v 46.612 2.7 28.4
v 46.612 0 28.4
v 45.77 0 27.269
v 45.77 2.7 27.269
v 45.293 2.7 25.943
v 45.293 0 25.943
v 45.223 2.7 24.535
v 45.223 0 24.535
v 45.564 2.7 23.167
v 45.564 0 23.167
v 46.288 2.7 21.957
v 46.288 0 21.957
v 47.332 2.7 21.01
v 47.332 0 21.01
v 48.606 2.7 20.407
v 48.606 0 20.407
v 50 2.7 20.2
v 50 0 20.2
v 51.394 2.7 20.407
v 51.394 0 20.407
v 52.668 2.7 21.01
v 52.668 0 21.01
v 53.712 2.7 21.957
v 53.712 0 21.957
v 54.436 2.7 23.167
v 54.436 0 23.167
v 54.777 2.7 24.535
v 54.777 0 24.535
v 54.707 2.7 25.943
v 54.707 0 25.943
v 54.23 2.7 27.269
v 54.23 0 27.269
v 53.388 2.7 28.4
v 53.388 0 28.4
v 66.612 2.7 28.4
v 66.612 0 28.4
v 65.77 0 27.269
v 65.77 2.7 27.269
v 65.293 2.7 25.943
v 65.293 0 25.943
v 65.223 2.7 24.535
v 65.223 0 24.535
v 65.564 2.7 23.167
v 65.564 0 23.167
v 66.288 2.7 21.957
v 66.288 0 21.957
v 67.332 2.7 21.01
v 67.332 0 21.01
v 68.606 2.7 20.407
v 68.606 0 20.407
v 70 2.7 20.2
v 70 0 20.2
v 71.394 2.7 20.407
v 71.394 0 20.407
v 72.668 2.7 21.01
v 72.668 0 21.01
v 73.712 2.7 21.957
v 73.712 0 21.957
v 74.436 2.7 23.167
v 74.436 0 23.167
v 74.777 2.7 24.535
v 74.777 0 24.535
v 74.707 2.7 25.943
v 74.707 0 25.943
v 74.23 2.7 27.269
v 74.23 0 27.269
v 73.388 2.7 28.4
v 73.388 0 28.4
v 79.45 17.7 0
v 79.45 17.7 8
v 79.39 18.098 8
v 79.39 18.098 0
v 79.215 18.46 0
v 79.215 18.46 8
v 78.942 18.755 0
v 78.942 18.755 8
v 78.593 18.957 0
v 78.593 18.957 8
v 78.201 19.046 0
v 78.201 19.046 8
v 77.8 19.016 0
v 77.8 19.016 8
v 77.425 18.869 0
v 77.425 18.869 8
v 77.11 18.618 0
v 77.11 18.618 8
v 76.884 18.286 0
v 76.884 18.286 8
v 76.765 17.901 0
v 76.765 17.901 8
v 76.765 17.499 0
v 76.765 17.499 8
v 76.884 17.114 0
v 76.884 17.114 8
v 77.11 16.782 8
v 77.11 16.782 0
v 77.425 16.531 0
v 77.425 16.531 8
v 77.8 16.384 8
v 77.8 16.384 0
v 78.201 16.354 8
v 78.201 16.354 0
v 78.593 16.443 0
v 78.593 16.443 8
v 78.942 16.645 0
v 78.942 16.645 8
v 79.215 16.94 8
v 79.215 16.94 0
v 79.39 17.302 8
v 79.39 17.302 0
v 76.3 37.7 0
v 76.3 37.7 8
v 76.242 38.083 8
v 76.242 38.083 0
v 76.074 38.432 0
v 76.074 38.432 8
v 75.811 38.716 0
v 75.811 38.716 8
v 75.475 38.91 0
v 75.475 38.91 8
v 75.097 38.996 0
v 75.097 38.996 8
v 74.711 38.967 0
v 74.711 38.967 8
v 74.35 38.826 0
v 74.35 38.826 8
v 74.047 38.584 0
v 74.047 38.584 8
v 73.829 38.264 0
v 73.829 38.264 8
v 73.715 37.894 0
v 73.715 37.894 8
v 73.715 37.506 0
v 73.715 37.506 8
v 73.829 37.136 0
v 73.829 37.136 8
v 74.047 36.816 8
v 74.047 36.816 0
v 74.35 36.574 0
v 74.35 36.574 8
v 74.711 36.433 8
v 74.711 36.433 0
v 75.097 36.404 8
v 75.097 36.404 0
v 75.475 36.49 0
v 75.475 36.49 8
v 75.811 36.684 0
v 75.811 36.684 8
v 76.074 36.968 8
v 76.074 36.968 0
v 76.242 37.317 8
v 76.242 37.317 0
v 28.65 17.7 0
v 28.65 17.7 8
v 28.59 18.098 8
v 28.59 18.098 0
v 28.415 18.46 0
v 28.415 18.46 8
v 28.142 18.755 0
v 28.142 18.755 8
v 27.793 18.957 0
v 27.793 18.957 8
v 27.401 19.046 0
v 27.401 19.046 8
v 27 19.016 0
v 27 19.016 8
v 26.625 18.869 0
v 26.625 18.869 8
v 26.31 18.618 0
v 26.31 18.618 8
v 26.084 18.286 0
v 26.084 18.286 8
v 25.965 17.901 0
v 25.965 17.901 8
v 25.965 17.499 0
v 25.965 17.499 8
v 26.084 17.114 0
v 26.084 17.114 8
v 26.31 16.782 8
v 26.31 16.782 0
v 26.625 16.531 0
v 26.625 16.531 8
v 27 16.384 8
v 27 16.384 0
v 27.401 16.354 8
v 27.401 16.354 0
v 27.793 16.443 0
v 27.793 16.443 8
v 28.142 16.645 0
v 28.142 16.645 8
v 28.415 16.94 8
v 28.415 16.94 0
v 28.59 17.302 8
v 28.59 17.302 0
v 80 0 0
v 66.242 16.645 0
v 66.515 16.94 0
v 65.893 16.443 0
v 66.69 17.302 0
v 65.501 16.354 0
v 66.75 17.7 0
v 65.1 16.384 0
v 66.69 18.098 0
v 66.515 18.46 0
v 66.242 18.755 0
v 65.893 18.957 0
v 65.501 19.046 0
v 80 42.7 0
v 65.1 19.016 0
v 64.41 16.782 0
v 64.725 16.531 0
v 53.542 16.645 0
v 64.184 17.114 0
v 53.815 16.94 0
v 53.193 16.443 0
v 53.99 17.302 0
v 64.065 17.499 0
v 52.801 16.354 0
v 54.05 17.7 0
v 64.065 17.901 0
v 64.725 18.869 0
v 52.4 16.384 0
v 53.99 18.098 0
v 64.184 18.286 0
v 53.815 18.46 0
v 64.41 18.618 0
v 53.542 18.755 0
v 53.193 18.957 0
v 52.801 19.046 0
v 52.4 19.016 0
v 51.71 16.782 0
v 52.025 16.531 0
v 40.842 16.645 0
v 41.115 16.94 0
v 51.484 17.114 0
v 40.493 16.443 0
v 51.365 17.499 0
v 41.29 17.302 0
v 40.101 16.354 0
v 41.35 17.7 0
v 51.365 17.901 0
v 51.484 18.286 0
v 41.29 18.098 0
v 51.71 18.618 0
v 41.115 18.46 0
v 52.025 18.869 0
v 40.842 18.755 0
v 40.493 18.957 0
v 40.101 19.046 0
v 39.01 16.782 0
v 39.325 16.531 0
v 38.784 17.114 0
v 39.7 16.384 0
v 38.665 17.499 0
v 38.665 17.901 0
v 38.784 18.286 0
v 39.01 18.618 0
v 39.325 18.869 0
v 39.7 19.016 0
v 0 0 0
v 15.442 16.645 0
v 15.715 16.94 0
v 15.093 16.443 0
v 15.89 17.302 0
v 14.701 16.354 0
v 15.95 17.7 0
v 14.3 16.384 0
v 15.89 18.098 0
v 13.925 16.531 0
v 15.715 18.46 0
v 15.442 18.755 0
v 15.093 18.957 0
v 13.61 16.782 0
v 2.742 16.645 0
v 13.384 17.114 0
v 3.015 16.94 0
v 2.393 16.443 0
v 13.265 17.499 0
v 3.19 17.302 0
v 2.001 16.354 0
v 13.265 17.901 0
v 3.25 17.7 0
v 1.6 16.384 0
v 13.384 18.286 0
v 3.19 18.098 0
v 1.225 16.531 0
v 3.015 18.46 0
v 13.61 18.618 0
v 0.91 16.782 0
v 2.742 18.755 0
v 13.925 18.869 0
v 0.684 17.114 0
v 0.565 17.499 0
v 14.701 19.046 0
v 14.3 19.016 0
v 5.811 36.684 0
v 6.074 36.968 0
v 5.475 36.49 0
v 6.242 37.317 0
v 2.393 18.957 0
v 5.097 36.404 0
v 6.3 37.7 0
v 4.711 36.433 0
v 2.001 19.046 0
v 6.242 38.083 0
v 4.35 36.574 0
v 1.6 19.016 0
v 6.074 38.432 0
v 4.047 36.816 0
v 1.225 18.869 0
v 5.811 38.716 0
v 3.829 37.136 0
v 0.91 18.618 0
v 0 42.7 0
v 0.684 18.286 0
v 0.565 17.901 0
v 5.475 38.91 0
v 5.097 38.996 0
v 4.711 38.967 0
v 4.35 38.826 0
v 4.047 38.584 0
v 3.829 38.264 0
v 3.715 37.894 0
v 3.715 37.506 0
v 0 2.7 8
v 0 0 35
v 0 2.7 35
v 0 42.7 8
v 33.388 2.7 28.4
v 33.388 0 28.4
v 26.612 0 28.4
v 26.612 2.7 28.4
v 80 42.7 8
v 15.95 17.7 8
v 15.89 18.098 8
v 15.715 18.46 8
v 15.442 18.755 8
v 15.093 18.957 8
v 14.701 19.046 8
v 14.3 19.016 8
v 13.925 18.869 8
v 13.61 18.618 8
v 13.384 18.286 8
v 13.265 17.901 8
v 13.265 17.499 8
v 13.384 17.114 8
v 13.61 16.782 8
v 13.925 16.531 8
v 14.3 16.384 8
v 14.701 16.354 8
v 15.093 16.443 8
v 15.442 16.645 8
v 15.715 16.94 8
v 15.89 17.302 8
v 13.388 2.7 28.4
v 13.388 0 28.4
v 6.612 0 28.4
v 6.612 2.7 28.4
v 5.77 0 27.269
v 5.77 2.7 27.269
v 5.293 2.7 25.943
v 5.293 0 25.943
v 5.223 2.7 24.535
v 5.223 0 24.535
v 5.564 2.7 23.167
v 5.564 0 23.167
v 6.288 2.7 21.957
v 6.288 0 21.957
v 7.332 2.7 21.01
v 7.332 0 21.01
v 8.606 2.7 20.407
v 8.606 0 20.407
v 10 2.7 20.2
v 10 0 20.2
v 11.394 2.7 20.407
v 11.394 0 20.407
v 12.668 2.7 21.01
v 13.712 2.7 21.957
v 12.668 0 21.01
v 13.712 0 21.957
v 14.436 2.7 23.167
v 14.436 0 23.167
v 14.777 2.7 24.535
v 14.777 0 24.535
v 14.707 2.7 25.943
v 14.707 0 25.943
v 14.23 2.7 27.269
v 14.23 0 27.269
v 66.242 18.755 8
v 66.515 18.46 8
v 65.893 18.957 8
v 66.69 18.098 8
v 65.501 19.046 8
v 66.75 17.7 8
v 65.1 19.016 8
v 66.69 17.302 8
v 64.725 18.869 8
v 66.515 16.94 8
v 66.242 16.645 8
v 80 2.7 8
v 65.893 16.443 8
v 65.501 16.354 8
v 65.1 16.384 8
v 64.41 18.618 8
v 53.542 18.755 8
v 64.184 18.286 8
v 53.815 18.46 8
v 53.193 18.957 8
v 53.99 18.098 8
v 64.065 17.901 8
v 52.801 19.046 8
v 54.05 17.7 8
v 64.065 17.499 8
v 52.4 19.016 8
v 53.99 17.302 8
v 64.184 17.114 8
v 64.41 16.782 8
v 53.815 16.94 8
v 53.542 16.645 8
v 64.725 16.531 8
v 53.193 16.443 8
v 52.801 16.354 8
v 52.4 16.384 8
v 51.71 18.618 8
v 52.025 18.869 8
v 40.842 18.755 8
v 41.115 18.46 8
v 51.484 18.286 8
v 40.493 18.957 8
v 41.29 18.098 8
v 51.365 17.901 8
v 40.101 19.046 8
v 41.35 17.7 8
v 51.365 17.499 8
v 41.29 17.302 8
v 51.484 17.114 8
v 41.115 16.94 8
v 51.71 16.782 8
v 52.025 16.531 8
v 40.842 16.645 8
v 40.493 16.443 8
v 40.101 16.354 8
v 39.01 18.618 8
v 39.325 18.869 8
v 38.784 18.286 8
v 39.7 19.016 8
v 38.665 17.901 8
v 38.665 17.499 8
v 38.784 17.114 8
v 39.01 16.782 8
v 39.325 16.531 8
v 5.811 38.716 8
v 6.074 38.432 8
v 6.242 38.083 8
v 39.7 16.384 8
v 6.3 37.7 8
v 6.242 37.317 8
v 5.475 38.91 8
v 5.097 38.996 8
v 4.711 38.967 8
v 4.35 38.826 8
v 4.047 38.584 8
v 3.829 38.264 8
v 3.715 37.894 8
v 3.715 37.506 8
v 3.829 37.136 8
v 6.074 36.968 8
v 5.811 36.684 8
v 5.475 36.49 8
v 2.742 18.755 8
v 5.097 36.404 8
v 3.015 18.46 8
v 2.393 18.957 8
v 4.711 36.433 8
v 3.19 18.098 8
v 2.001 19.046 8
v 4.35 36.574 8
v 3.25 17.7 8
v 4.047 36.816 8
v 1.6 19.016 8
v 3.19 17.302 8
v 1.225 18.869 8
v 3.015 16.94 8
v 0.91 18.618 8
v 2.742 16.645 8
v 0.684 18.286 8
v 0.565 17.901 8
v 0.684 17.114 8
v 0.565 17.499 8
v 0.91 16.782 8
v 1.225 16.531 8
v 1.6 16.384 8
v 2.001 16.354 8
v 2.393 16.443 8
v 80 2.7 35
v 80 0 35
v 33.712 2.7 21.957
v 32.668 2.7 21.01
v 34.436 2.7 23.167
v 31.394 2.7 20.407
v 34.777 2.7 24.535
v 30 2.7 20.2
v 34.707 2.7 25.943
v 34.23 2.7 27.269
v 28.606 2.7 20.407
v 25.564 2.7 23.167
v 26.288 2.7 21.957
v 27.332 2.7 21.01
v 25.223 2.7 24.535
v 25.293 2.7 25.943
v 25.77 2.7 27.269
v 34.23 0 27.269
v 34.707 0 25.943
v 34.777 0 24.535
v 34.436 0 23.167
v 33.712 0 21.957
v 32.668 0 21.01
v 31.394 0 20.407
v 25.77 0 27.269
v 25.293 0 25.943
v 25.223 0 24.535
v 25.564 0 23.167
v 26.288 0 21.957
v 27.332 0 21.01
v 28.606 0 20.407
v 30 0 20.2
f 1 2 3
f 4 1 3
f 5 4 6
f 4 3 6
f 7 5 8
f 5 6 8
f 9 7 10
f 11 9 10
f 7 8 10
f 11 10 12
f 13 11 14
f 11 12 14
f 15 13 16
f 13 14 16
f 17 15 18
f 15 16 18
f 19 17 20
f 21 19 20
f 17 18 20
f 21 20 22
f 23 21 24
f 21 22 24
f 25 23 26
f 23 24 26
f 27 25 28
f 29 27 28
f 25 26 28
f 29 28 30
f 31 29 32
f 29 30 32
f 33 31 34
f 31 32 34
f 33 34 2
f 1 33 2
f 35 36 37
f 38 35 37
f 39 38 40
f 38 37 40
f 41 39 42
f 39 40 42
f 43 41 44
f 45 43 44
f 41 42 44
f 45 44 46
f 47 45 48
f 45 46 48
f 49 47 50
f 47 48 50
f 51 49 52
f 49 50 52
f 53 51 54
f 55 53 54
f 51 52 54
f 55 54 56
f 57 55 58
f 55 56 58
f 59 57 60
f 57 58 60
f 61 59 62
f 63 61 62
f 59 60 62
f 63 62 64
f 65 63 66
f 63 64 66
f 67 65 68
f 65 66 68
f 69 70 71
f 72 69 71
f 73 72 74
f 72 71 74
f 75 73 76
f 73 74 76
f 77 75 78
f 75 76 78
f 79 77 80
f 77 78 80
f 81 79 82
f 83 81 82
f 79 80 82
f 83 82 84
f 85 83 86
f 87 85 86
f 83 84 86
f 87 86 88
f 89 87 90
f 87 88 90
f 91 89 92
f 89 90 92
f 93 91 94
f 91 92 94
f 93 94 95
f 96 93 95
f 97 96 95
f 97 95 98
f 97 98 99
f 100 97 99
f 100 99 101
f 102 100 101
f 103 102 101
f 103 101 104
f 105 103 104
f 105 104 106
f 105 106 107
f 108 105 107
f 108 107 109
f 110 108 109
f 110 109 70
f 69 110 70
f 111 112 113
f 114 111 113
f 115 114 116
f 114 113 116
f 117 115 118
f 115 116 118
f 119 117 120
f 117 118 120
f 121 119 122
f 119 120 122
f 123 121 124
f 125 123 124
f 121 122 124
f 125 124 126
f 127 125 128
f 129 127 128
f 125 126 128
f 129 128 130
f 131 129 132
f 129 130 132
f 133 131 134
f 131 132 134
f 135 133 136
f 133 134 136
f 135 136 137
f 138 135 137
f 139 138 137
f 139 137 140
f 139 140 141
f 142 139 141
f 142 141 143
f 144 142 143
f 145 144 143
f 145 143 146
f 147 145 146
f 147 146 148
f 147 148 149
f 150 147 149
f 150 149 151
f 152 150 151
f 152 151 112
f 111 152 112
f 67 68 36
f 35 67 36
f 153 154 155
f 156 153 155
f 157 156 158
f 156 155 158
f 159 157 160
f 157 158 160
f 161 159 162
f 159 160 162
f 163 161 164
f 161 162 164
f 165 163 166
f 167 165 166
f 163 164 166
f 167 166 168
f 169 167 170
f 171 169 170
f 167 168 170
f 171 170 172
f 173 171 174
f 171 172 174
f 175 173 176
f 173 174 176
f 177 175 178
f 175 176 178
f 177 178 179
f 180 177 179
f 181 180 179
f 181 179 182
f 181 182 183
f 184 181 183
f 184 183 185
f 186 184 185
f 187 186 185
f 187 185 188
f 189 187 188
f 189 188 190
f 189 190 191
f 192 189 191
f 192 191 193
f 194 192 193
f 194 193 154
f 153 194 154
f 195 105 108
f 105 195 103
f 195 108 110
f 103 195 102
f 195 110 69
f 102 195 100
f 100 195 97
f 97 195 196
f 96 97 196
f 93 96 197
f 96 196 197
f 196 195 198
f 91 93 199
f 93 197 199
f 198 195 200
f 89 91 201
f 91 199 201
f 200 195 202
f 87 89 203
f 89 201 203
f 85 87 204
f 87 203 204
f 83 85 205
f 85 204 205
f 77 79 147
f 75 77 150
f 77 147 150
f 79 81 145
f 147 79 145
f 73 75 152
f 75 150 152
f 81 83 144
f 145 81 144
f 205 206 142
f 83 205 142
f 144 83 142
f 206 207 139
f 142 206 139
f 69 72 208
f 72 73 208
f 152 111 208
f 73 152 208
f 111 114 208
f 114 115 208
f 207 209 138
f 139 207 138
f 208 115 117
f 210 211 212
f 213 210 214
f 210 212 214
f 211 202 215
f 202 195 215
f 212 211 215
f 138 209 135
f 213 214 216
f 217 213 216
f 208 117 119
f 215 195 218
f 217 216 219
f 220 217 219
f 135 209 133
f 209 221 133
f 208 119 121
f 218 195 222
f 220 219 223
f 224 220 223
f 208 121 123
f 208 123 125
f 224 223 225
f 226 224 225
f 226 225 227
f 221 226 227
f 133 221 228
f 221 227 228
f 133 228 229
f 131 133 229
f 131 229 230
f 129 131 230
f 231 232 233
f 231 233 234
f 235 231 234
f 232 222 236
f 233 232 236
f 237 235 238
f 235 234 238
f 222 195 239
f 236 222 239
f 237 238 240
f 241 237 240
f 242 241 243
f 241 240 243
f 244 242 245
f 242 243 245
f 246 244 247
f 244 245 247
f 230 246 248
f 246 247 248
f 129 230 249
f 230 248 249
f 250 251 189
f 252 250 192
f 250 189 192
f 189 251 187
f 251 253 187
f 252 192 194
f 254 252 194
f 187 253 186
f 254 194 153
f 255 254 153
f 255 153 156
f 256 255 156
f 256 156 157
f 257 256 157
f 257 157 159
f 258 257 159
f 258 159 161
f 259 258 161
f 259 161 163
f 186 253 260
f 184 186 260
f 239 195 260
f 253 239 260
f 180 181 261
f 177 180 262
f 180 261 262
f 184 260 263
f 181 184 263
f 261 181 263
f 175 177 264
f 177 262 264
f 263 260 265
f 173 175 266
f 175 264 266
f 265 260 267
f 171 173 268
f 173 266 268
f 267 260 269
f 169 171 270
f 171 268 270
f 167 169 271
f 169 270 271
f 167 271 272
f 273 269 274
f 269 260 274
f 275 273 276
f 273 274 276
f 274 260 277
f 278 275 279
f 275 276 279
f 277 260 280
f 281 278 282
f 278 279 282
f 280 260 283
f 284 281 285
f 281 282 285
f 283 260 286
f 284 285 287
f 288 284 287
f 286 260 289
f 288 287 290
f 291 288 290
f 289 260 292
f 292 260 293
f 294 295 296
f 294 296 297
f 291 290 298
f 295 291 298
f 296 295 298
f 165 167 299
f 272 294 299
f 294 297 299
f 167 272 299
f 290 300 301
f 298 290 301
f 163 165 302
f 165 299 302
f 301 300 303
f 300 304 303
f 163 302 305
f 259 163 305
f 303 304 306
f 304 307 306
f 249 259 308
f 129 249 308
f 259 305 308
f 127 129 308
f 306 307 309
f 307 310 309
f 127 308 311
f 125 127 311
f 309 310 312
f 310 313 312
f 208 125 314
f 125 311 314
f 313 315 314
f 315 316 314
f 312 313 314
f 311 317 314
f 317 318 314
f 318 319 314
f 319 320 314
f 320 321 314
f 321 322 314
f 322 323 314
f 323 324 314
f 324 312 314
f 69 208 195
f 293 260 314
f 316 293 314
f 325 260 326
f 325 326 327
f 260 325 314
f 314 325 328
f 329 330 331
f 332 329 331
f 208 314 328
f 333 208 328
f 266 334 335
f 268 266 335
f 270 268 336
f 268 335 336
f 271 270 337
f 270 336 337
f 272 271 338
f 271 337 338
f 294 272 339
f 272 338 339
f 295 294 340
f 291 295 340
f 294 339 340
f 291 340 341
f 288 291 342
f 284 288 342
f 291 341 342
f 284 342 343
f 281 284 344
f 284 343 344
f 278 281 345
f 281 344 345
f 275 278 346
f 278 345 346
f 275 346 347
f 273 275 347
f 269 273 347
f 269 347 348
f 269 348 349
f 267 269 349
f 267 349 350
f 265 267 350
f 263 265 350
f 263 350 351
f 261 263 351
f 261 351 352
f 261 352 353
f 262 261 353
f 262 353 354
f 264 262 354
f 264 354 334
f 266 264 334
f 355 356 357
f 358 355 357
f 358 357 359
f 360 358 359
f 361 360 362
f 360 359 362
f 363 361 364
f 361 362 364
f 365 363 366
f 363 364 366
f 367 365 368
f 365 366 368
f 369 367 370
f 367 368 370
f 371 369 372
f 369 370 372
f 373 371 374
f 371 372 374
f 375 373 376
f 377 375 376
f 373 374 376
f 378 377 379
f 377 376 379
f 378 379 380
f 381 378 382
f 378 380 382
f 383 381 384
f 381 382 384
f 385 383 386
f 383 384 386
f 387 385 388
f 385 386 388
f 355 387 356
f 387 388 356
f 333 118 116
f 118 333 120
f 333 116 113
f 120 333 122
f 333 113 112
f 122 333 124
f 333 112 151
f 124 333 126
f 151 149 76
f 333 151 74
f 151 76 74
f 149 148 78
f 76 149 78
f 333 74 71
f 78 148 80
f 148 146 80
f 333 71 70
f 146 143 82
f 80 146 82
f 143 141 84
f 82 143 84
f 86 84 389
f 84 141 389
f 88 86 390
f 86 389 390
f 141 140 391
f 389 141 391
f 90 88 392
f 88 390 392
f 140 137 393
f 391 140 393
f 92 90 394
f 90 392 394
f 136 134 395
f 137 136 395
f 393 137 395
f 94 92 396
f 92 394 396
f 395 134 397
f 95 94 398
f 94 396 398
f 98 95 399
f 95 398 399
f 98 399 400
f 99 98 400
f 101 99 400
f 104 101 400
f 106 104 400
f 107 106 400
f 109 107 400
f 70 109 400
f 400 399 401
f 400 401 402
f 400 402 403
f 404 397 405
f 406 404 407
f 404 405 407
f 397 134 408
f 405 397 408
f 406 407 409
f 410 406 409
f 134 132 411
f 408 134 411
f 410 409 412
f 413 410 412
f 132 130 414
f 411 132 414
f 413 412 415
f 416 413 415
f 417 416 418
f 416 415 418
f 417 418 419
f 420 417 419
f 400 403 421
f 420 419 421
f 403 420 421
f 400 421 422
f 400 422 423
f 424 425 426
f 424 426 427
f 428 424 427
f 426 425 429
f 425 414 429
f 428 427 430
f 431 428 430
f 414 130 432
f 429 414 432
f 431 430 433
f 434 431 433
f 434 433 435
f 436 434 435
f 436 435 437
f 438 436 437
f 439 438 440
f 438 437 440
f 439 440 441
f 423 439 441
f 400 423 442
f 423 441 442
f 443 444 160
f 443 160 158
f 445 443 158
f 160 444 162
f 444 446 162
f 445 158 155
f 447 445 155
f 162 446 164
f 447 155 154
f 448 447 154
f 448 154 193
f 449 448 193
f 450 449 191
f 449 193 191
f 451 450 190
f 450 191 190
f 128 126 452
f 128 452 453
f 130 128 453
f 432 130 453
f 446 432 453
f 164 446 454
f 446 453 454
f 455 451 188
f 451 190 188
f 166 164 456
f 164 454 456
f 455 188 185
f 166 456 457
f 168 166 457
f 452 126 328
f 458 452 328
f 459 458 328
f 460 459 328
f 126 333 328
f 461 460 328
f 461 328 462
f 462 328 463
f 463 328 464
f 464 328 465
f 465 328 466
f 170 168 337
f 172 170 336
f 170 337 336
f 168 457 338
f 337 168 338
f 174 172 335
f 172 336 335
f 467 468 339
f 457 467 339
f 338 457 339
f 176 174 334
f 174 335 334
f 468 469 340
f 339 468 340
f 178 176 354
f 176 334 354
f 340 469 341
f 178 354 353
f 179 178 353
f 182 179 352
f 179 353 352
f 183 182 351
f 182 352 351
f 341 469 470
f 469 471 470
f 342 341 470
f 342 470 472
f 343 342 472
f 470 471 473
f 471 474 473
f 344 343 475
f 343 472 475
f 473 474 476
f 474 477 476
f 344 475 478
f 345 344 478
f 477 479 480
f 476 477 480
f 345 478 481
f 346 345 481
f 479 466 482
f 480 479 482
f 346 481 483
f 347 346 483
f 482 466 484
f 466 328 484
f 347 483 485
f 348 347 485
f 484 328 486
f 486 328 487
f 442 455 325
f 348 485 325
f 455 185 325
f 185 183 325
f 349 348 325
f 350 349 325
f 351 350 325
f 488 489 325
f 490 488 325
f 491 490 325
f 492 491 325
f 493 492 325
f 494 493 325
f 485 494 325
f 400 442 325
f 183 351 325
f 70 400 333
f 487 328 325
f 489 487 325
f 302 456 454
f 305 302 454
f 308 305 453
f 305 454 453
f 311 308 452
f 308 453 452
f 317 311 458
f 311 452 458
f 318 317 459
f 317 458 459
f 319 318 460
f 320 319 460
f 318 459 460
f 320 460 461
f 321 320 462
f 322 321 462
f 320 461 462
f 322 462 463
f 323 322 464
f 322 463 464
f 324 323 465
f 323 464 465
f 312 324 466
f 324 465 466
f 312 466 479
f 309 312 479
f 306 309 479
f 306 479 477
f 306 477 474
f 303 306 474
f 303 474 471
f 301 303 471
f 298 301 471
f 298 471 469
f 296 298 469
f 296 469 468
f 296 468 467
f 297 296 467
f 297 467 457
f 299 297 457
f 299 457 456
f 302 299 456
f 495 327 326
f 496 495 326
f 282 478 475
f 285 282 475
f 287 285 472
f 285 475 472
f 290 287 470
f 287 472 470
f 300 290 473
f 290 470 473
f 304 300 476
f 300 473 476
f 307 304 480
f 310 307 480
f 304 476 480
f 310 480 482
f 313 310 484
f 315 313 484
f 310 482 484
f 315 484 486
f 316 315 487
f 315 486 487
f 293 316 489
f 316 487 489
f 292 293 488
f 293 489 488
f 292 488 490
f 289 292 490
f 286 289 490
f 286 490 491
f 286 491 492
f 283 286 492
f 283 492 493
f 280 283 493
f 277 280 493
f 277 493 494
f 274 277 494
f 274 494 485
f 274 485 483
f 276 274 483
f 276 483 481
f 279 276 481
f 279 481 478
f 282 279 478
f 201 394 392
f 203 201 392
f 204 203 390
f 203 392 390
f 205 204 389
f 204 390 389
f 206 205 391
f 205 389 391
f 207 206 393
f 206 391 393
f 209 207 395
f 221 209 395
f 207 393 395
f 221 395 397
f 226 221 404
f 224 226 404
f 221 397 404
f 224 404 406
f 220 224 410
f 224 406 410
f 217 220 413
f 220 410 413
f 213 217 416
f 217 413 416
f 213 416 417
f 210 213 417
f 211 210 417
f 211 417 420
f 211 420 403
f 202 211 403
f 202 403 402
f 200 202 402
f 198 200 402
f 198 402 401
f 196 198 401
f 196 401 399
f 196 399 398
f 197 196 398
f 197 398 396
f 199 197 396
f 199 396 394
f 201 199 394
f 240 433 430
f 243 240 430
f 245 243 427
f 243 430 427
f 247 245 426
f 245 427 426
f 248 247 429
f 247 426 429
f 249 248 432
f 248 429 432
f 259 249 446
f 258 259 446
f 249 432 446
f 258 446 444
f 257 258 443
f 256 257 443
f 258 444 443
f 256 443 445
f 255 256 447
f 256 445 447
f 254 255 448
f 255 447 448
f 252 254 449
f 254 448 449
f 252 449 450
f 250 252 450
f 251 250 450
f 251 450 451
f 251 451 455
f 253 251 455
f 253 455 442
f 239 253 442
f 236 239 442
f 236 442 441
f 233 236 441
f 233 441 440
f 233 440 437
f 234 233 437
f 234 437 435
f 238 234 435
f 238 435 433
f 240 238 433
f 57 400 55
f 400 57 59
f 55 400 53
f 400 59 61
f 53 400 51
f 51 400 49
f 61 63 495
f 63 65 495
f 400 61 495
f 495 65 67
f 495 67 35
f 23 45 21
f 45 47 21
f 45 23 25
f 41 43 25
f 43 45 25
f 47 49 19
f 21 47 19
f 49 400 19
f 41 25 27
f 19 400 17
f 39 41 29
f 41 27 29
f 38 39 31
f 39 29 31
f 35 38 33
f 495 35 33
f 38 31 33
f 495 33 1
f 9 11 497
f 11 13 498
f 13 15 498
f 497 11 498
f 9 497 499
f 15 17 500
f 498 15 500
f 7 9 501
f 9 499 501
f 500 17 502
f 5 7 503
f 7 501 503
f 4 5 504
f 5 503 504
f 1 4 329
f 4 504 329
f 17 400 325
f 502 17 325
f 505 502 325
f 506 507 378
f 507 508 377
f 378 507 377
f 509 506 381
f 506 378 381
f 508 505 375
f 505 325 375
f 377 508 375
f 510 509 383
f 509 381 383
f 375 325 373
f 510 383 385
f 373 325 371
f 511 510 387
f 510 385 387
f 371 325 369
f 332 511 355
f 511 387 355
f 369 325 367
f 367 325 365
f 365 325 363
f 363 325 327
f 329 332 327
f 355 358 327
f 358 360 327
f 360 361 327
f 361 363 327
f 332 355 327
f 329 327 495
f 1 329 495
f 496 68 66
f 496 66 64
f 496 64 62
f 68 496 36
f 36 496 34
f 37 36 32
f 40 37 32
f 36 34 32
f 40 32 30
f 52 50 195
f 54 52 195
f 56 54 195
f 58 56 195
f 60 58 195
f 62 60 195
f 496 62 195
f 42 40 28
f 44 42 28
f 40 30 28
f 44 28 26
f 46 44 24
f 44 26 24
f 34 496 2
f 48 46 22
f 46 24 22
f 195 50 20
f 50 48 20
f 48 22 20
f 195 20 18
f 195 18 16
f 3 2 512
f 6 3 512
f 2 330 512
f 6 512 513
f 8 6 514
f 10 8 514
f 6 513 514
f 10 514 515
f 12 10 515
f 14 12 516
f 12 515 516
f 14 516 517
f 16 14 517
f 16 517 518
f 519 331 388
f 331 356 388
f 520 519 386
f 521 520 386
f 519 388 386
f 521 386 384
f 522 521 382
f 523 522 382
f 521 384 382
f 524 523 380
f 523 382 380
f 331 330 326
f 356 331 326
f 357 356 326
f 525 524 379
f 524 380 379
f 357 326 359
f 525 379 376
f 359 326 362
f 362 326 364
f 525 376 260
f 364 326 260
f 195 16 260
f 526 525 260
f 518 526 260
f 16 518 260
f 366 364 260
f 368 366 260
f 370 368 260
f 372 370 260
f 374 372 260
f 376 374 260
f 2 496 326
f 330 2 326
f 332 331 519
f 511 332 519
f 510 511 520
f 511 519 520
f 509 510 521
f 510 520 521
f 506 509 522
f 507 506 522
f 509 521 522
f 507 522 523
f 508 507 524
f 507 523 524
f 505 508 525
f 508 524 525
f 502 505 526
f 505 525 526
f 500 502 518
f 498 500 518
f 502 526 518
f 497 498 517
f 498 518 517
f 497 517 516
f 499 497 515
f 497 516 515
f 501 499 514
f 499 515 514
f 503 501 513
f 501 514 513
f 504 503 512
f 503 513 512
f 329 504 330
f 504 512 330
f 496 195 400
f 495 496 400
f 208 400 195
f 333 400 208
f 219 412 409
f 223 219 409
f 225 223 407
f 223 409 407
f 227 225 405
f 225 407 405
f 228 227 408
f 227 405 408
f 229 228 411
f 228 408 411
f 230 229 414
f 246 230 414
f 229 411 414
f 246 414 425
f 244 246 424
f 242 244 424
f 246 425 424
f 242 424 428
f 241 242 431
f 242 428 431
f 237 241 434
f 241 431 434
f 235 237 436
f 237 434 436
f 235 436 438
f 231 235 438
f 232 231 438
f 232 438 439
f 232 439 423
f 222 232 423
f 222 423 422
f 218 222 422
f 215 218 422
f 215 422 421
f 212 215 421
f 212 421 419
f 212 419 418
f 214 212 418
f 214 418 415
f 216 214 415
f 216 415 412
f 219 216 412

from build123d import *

# Parameters (mm, degrees)
F1_DEPTH = 80
F3_DEPTH = 42.701
F4_R     = 1.3
F4_R_2   = 1.35
F5_DEPTH = 8.001


with BuildPart() as f1:
    # F0 (on Right) → F1 (new body)
    with BuildSketch(Plane.YZ):
        Polygon((0, 35), (0, 0), (42.7, 0), (42.7, 8), (2.7, 8), (2.7, 35), align=None)
    extrude(amount=F1_DEPTH)

    # F2 (on face) → F3 (cut, through all)
    with BuildSketch(Plane.XZ):
        with BuildLine():
            Line((13.388215, 28.4), (6.611785, 28.4))
            ThreePointArc((6.611785, 28.4), (10, 20.2), (13.388215, 28.4))
        make_face()
        with BuildLine():
            Line((33.388215, 28.4), (26.611785, 28.4))
            ThreePointArc((26.611785, 28.4), (30, 20.2), (33.388215, 28.4))
        make_face()
        with BuildLine():
            Line((53.388215, 28.4), (46.611785, 28.4))
            ThreePointArc((46.611785, 28.4), (50, 20.2), (53.388215, 28.4))
        make_face()
        with BuildLine():
            Line((73.388215, 28.4), (66.611785, 28.4))
            ThreePointArc((66.611785, 28.4), (70, 20.2), (73.388215, 28.4))
        make_face()
    extrude(amount=-F3_DEPTH, mode=Mode.SUBTRACT)

    # F4 (on face) → F5 (cut, through all)
    with BuildSketch(Plane.XY.offset(8)):
        with Locations((5, 37.7)):
            Circle(F4_R)
        with Locations((75, 37.7)):
            Circle(F4_R)
        with Locations((14.6, 17.7)):
            Circle(F4_R_2)
        with Locations((27.3, 17.7)):
            Circle(F4_R_2)
        with Locations((1.9, 17.7)):
            Circle(F4_R_2)
        with Locations((40, 17.7)):
            Circle(F4_R_2)
        with Locations((52.7, 17.7)):
            Circle(F4_R_2)
        with Locations((65.4, 17.7)):
            Circle(F4_R_2)
        with Locations((78.1, 17.7)):
            Circle(F4_R_2)
    extrude(amount=-F5_DEPTH, mode=Mode.SUBTRACT)


solid = f1.part
